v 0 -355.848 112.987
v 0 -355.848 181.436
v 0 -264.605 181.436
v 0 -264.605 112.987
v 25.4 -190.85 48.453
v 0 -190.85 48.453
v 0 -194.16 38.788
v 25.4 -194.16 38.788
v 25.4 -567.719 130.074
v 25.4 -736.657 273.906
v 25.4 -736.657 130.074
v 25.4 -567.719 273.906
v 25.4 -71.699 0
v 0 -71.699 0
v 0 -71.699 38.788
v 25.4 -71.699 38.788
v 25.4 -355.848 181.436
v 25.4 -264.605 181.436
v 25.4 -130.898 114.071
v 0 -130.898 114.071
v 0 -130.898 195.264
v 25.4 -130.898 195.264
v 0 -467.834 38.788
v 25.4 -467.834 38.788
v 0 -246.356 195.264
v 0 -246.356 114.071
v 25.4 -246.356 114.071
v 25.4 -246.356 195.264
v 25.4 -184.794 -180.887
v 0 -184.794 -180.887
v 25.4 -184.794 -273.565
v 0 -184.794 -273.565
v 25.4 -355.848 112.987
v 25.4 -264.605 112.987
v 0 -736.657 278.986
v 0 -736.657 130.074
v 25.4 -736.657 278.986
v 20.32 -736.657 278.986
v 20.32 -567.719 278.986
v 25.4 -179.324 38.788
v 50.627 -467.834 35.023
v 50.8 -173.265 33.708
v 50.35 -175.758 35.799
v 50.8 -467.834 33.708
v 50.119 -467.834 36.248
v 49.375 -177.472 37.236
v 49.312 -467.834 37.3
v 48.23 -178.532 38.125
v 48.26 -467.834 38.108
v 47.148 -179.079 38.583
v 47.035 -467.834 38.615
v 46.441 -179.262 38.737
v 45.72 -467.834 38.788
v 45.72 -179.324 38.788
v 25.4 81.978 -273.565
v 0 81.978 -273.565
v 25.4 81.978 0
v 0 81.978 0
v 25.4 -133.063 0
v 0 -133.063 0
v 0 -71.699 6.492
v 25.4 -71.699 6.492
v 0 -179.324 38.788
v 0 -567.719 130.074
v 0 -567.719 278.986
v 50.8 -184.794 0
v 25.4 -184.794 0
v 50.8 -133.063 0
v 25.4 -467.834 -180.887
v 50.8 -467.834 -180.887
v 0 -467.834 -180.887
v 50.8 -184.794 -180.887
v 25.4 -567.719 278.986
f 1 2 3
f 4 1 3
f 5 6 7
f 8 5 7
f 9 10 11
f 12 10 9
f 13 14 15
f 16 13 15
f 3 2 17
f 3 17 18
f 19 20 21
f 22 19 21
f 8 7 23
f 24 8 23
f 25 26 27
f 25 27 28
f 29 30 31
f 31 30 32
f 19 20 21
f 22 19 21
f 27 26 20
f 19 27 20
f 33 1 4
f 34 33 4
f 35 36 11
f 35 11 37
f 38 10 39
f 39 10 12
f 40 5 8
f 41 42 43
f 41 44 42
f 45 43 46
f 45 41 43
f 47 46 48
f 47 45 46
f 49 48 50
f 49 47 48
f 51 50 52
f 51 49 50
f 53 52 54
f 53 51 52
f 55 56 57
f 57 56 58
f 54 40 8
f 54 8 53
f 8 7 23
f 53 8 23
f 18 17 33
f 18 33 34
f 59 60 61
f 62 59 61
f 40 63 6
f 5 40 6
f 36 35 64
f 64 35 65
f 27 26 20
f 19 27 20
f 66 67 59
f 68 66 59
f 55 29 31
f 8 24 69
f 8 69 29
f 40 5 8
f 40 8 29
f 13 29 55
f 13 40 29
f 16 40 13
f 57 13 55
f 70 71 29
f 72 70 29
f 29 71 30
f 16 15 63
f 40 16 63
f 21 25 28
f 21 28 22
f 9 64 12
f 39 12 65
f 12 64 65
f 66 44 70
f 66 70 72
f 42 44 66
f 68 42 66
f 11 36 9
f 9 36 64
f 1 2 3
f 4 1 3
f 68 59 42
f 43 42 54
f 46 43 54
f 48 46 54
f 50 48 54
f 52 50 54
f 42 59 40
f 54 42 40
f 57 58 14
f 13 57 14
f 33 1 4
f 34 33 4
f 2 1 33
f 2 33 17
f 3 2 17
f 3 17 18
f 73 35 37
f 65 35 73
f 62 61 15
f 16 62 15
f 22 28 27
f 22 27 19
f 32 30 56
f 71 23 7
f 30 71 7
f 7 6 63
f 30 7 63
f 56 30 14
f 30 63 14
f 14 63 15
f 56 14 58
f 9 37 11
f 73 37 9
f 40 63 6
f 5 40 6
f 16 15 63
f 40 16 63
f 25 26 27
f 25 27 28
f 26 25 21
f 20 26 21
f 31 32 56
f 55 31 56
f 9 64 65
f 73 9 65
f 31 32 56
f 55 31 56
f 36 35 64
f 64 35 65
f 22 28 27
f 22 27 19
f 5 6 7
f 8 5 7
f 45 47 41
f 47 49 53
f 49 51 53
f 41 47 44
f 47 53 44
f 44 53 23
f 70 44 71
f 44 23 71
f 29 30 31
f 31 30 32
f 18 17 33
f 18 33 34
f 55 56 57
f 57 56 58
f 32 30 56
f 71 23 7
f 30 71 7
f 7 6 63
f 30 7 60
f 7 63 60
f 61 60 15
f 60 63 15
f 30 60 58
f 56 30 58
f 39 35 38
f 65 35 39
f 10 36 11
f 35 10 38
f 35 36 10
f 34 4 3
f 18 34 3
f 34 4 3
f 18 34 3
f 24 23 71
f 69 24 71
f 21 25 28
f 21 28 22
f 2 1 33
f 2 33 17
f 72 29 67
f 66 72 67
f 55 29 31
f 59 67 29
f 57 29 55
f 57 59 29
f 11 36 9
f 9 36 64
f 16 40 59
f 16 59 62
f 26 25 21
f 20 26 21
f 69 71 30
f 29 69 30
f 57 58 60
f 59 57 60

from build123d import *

# Parameters (mm, degrees)
F1_DEPTH = 50.8
F0_W     = 91.2430882454
F0_H     = 68.4492141008
F2_DEPTH = 25.4
F0_W_2   = 115.458458662
F0_H_2   = 81.1929479241
F0_W_3   = 168.9379811287
F0_H_3   = 148.9126831293
F3_DEPTH = 25.4
F5_R     = 5.08
F6_SIZE  = 5.08


# Not quite as in the source:
# - a feature names something its author has since deleted; it is built from what else it names


with BuildPart() as f1:
    # F0 (on Right) → F1 (new body)
    with BuildSketch(Plane.YZ):
        Polygon((-179.3236301752, 38.788150996), (-194.1602993403, 38.788150996), (-467.8339660168, 38.788150996), (-467.8339660168, -180.8865964413), (-184.7935318947, -180.8865964413), (-184.7935318947, 0), (-133.0628544092, 0), align=None)
    extrude(amount=F1_DEPTH)

    # F0 (on Right) → F2, piece 4 (join)
    with BuildSketch(Plane.YZ):
        Polygon((-190.8501535654, 48.4527647495), (-194.1602993403, 38.788150996), (-179.3236301752, 38.788150996), align=None)
        Polygon((-71.699462831, 38.788150996), (-179.3236301752, 38.788150996), (-133.0628544092, 0), (-71.699462831, 6.4919903721), align=None)
        Polygon((-71.699462831, 0), (-133.0628544092, 0), (-184.7935318947, 0), (-184.7935318947, -180.8865964413), (-71.699462831, -180.8865964413), align=None)
        Polygon((-179.3236301752, 38.788150996), (-194.1602993403, 38.788150996), (-467.8339660168, 38.788150996), (-467.8339660168, -180.8865964413), (-184.7935318947, -180.8865964413), (-184.7935318947, 0), (-133.0628544092, 0), align=None)
        Polygon((-71.699462831, -180.8865964413), (-184.7935318947, -180.8865964413), (-184.7935318947, -273.5652923584), (81.9780081511, -273.5652923584), (81.9780081511, 0), (-71.699462831, 0), align=None)
    extrude(amount=F2_DEPTH)

    # F5
    f5_edges = [f1.edges().sort_by_distance(p)[0] for p in [
        (50.8, -323.578798, 38.788151),
    ]]
    fillet(f5_edges, radius=F5_R)


with BuildPart() as f2:
    # F0 (on Right) → F2 (new body)
    with BuildSketch(Plane.YZ):
        with Locations((-310.2265298367, 147.2113803029)):
            Rectangle(F0_W, F0_H)
    extrude(amount=F2_DEPTH)


with BuildPart() as f2b:
    # F0 (on Right) → F2, piece 2 (new body)
    with BuildSketch(Plane.YZ):
        with Locations((-188.6271387339, 154.6672396362)):
            Rectangle(F0_W_2, F0_H_2)
    extrude(amount=F2_DEPTH)


with BuildPart() as f2c:
    # F0 (on Right) → F2, piece 3 (new body)
    with BuildSketch(Plane.YZ):
        with Locations((-652.1882116795, 204.530082643)):
            Rectangle(F0_W_3, F0_H_3)
    extrude(amount=F2_DEPTH)

    # F6
    f6_edges = [f2c.edges().sort_by_distance(p)[0] for p in [
        (25.4, -652.188212, 278.986424),
    ]]
    chamfer(f6_edges, length=F6_SIZE)


with BuildPart() as f3:
    # F0 (on Right) → F3 (new body)
    with BuildSketch(Plane.YZ):
        Polygon((-179.3236301752, 38.788150996), (-194.1602993403, 38.788150996), (-467.8339660168, 38.788150996), (-467.8339660168, -180.8865964413), (-184.7935318947, -180.8865964413), (-184.7935318947, 0), (-133.0628544092, 0), align=None)
        Polygon((-190.8501535654, 48.4527647495), (-194.1602993403, 38.788150996), (-179.3236301752, 38.788150996), align=None)
        Polygon((-71.699462831, 38.788150996), (-179.3236301752, 38.788150996), (-133.0628544092, 0), (-71.699462831, 6.4919903721), align=None)
        Polygon((-71.699462831, 0), (-133.0628544092, 0), (-184.7935318947, 0), (-184.7935318947, -180.8865964413), (-71.699462831, -180.8865964413), align=None)
        Polygon((-71.699462831, 6.4919903721), (-133.0628544092, 0), (-71.699462831, 0), align=None)
        Polygon((-71.699462831, -180.8865964413), (-184.7935318947, -180.8865964413), (-184.7935318947, -273.5652923584), (81.9780081511, -273.5652923584), (81.9780081511, 0), (-71.699462831, 0), align=None)
    extrude(amount=F3_DEPTH)


with BuildPart() as f3b:
    # F0 (on Right) → F3, piece 2 (new body)
    with BuildSketch(Plane.YZ):
        with Locations((-310.2265298367, 147.2113803029)):
            Rectangle(F0_W, F0_H)
    extrude(amount=F3_DEPTH)


with BuildPart() as f3c:
    # F0 (on Right) → F3, piece 3 (new body)
    with BuildSketch(Plane.YZ):
        with Locations((-188.6271387339, 154.6672396362)):
            Rectangle(F0_W_2, F0_H_2)
    extrude(amount=F3_DEPTH)


with BuildPart() as f3d:
    # F0 (on Right) → F3, piece 4 (new body)
    with BuildSketch(Plane.YZ):
        with Locations((-652.1882116795, 204.530082643)):
            Rectangle(F0_W_3, F0_H_3)
    extrude(amount=F3_DEPTH)


solid = Compound([f1.part, f2.part, f2b.part, f2c.part, f3.part, f3b.part, f3c.part, f3d.part])
